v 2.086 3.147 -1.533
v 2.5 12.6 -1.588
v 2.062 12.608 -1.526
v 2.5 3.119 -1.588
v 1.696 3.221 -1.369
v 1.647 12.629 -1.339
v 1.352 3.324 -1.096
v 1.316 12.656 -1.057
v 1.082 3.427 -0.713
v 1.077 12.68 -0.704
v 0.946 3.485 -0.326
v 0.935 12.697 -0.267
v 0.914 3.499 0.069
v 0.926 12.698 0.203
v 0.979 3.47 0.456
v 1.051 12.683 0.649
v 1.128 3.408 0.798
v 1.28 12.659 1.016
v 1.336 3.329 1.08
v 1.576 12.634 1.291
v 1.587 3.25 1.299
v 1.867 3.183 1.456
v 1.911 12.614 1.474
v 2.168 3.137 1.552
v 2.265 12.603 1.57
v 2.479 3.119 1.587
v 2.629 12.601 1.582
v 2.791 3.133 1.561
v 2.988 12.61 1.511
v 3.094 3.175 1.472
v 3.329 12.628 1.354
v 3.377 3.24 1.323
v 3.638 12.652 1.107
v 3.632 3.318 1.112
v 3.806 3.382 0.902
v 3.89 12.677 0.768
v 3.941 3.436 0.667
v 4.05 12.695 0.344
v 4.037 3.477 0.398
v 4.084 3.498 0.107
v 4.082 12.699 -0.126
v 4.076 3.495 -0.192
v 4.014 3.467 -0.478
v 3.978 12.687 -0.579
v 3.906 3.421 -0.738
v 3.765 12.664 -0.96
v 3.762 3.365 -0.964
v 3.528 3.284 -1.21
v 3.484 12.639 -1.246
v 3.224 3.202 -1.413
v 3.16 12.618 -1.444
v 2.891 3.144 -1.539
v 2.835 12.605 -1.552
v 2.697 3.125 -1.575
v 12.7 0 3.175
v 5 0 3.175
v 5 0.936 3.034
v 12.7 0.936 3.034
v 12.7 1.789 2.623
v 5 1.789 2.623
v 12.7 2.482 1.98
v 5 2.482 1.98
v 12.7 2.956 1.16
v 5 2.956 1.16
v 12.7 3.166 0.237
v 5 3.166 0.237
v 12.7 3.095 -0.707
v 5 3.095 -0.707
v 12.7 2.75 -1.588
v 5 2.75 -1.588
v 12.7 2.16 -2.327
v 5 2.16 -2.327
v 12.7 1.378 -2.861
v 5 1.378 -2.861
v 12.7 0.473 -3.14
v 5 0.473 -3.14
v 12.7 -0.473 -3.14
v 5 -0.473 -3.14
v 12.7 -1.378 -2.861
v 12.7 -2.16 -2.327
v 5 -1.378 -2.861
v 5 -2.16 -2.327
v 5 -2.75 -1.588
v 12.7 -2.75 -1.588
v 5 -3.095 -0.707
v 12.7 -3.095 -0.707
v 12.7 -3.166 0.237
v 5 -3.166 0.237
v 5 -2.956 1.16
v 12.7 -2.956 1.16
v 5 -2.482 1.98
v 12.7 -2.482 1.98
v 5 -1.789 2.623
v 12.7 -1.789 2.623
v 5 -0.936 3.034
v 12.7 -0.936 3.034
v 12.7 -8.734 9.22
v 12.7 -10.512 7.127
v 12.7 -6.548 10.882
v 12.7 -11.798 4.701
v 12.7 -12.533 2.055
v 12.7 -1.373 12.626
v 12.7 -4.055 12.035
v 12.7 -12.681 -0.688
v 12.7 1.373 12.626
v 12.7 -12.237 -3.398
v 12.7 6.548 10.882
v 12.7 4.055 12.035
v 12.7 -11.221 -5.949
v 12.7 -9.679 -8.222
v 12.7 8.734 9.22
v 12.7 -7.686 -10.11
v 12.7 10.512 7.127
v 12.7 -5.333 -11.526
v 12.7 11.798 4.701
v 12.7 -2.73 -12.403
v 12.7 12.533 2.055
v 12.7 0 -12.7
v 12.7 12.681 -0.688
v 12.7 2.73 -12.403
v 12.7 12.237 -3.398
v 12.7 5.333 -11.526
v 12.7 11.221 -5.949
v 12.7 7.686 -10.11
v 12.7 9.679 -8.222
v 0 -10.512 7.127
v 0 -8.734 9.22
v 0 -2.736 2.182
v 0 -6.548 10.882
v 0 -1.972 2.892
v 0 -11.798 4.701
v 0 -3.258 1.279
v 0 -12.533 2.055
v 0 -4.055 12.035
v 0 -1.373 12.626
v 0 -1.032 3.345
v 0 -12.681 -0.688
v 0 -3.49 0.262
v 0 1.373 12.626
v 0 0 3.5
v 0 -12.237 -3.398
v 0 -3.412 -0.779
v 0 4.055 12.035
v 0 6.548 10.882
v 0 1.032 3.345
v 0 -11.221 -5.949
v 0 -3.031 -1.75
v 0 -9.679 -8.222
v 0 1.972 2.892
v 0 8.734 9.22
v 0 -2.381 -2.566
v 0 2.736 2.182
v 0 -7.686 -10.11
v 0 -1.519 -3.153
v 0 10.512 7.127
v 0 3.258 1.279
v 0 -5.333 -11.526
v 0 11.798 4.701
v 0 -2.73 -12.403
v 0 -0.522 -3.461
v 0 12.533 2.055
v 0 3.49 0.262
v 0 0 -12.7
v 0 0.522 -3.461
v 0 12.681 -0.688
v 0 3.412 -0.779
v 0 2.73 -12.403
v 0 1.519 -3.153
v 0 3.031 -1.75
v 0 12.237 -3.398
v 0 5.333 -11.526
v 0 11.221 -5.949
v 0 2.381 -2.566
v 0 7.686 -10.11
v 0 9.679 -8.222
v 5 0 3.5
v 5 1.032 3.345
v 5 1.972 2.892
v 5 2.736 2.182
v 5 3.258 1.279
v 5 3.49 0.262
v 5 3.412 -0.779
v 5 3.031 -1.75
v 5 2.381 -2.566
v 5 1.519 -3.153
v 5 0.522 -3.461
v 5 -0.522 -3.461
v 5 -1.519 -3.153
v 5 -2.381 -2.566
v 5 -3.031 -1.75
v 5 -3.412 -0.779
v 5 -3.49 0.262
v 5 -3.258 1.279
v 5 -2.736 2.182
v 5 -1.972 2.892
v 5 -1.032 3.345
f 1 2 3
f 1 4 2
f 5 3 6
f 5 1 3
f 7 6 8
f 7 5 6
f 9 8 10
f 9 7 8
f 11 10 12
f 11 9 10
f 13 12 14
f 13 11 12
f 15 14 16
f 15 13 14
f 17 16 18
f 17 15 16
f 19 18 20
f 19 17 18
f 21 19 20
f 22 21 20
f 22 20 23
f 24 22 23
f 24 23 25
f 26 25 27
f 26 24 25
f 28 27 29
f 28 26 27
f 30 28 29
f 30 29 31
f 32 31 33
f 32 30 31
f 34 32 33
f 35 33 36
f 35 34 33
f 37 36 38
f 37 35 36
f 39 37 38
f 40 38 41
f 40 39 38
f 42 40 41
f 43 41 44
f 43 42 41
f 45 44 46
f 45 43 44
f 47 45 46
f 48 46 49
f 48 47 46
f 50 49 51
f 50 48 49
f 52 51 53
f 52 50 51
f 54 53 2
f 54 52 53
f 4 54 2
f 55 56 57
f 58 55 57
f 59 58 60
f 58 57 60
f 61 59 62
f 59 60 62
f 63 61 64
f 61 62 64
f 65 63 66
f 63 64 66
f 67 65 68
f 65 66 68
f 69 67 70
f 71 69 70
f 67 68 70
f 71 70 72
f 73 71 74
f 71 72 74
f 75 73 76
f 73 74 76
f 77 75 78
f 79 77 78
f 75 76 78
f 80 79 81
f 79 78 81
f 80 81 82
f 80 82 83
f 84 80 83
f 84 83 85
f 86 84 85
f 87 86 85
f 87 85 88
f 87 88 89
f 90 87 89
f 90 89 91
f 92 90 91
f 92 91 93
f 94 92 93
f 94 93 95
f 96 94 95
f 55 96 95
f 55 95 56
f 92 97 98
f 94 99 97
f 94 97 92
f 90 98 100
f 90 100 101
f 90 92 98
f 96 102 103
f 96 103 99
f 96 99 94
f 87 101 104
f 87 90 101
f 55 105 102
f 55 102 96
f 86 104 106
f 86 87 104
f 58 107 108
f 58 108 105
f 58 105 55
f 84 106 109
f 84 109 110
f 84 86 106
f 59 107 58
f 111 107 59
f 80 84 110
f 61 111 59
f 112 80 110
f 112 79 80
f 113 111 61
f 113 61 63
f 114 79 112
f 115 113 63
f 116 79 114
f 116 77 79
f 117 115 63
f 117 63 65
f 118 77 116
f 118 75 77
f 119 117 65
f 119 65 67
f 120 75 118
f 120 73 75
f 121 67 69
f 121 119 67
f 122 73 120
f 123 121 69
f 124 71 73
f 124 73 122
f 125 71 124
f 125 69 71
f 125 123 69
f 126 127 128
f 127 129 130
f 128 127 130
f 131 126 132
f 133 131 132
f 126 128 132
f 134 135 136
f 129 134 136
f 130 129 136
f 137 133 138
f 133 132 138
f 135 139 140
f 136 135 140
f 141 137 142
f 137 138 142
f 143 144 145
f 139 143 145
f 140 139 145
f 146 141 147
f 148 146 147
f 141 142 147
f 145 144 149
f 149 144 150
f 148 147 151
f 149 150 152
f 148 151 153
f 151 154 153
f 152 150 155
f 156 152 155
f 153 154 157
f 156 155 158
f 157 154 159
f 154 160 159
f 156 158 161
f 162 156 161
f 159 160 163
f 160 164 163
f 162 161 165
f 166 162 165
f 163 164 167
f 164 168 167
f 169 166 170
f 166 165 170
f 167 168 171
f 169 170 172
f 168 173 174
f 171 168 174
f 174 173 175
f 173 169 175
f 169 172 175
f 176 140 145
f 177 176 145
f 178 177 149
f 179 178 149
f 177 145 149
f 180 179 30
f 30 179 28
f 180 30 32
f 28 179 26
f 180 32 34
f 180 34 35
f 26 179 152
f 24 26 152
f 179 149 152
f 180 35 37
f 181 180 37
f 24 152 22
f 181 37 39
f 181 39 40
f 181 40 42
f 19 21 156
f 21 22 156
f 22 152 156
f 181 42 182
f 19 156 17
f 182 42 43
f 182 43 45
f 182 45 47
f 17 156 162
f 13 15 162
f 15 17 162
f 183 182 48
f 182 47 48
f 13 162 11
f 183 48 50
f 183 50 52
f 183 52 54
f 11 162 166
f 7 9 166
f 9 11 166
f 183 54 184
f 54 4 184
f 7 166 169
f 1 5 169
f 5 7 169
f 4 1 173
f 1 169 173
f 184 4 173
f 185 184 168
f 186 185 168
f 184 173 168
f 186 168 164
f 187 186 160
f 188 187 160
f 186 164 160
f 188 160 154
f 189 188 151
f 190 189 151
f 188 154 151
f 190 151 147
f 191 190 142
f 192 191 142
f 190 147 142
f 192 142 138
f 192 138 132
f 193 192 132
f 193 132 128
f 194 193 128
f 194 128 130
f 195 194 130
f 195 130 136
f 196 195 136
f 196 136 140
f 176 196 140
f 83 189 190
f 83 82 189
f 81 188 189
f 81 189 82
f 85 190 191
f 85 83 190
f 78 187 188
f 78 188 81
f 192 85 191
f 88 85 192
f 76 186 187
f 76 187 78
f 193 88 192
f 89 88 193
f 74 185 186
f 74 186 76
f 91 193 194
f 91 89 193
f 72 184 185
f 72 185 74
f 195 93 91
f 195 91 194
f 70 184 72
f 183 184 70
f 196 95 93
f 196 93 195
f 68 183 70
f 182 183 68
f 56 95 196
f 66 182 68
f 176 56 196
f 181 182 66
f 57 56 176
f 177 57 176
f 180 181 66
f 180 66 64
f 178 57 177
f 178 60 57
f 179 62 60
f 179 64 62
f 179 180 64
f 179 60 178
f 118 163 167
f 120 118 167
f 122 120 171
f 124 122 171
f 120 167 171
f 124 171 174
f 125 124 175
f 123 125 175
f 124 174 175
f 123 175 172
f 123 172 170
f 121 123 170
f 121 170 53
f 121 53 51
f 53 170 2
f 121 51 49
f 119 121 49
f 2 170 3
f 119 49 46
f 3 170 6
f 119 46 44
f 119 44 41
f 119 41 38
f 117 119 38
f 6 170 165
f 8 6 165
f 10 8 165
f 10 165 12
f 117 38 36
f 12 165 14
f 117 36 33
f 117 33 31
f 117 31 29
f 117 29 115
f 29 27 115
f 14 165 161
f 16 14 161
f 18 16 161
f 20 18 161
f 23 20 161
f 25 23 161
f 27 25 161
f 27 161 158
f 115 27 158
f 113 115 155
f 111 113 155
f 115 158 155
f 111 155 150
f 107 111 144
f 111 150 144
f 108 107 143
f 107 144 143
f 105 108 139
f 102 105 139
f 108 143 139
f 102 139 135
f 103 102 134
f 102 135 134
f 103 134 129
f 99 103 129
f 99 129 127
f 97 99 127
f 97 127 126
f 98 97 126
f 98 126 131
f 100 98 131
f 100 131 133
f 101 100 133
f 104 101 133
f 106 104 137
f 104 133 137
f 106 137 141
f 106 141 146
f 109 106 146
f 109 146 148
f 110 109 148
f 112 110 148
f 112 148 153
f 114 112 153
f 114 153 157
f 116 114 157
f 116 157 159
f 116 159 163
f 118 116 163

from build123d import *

# Parameters (mm, degrees)
SKETCH1_R                       = 12.7
BOSS_EXTRUDE1_DEPTH             = 12.7
SKETCH2_R                       = 3.5
CUT_EXTRUDE1_DEPTH              = 5
F_1_4_0_25_DIAMETER_HOLE1_D     = 6.35
F_1_4_0_25_DIAMETER_HOLE1_DEPTH = 10.16
F_1_4_0_25_DIAMETER_HOLE1_TIP   = 1.907732465


with BuildPart() as part:
    # Sketch1 → Boss-Extrude1 (new body)
    with BuildSketch(Plane(origin=(0, 0, 0), x_dir=(0, 0, -1), z_dir=(1, 0, 0))):
        Circle(SKETCH1_R)
    extrude(amount=BOSS_EXTRUDE1_DEPTH)

    # Sketch2 → Cut-Extrude1 (cut)
    with BuildSketch(Plane.ZY):
        Circle(SKETCH2_R)
    extrude(amount=-CUT_EXTRUDE1_DEPTH, mode=Mode.SUBTRACT)

    # 1/4 (0.25) Diameter Hole1
    with Locations(Plane(origin=(12.7, 0, 0), x_dir=(0, 0, -1), z_dir=(1, 0, 0))):
        with Locations((0, 0)):
            Hole(F_1_4_0_25_DIAMETER_HOLE1_D / 2, depth=F_1_4_0_25_DIAMETER_HOLE1_DEPTH)
            with Locations((0, 0, -(F_1_4_0_25_DIAMETER_HOLE1_DEPTH + F_1_4_0_25_DIAMETER_HOLE1_TIP / 2))):  # 118° drill point
                Cone(0, F_1_4_0_25_DIAMETER_HOLE1_D / 2, F_1_4_0_25_DIAMETER_HOLE1_TIP, mode=Mode.SUBTRACT)

    # Sketch7 → 1/8 (0.125) Diameter Hole1 (revolve, cut)
    with BuildSketch(Plane(origin=(2.5, 0, 0), x_dir=(0, 0, -1), z_dir=(1, 0, 0))):
        Polygon((0, 0), (0, 16.193866233), (1.5875, 15.24), (1.5875, 0), align=None)
    revolve(axis=Axis((2.5, -6.35, 0), (0, 1, 0)), mode=Mode.SUBTRACT)


solid = part.part
